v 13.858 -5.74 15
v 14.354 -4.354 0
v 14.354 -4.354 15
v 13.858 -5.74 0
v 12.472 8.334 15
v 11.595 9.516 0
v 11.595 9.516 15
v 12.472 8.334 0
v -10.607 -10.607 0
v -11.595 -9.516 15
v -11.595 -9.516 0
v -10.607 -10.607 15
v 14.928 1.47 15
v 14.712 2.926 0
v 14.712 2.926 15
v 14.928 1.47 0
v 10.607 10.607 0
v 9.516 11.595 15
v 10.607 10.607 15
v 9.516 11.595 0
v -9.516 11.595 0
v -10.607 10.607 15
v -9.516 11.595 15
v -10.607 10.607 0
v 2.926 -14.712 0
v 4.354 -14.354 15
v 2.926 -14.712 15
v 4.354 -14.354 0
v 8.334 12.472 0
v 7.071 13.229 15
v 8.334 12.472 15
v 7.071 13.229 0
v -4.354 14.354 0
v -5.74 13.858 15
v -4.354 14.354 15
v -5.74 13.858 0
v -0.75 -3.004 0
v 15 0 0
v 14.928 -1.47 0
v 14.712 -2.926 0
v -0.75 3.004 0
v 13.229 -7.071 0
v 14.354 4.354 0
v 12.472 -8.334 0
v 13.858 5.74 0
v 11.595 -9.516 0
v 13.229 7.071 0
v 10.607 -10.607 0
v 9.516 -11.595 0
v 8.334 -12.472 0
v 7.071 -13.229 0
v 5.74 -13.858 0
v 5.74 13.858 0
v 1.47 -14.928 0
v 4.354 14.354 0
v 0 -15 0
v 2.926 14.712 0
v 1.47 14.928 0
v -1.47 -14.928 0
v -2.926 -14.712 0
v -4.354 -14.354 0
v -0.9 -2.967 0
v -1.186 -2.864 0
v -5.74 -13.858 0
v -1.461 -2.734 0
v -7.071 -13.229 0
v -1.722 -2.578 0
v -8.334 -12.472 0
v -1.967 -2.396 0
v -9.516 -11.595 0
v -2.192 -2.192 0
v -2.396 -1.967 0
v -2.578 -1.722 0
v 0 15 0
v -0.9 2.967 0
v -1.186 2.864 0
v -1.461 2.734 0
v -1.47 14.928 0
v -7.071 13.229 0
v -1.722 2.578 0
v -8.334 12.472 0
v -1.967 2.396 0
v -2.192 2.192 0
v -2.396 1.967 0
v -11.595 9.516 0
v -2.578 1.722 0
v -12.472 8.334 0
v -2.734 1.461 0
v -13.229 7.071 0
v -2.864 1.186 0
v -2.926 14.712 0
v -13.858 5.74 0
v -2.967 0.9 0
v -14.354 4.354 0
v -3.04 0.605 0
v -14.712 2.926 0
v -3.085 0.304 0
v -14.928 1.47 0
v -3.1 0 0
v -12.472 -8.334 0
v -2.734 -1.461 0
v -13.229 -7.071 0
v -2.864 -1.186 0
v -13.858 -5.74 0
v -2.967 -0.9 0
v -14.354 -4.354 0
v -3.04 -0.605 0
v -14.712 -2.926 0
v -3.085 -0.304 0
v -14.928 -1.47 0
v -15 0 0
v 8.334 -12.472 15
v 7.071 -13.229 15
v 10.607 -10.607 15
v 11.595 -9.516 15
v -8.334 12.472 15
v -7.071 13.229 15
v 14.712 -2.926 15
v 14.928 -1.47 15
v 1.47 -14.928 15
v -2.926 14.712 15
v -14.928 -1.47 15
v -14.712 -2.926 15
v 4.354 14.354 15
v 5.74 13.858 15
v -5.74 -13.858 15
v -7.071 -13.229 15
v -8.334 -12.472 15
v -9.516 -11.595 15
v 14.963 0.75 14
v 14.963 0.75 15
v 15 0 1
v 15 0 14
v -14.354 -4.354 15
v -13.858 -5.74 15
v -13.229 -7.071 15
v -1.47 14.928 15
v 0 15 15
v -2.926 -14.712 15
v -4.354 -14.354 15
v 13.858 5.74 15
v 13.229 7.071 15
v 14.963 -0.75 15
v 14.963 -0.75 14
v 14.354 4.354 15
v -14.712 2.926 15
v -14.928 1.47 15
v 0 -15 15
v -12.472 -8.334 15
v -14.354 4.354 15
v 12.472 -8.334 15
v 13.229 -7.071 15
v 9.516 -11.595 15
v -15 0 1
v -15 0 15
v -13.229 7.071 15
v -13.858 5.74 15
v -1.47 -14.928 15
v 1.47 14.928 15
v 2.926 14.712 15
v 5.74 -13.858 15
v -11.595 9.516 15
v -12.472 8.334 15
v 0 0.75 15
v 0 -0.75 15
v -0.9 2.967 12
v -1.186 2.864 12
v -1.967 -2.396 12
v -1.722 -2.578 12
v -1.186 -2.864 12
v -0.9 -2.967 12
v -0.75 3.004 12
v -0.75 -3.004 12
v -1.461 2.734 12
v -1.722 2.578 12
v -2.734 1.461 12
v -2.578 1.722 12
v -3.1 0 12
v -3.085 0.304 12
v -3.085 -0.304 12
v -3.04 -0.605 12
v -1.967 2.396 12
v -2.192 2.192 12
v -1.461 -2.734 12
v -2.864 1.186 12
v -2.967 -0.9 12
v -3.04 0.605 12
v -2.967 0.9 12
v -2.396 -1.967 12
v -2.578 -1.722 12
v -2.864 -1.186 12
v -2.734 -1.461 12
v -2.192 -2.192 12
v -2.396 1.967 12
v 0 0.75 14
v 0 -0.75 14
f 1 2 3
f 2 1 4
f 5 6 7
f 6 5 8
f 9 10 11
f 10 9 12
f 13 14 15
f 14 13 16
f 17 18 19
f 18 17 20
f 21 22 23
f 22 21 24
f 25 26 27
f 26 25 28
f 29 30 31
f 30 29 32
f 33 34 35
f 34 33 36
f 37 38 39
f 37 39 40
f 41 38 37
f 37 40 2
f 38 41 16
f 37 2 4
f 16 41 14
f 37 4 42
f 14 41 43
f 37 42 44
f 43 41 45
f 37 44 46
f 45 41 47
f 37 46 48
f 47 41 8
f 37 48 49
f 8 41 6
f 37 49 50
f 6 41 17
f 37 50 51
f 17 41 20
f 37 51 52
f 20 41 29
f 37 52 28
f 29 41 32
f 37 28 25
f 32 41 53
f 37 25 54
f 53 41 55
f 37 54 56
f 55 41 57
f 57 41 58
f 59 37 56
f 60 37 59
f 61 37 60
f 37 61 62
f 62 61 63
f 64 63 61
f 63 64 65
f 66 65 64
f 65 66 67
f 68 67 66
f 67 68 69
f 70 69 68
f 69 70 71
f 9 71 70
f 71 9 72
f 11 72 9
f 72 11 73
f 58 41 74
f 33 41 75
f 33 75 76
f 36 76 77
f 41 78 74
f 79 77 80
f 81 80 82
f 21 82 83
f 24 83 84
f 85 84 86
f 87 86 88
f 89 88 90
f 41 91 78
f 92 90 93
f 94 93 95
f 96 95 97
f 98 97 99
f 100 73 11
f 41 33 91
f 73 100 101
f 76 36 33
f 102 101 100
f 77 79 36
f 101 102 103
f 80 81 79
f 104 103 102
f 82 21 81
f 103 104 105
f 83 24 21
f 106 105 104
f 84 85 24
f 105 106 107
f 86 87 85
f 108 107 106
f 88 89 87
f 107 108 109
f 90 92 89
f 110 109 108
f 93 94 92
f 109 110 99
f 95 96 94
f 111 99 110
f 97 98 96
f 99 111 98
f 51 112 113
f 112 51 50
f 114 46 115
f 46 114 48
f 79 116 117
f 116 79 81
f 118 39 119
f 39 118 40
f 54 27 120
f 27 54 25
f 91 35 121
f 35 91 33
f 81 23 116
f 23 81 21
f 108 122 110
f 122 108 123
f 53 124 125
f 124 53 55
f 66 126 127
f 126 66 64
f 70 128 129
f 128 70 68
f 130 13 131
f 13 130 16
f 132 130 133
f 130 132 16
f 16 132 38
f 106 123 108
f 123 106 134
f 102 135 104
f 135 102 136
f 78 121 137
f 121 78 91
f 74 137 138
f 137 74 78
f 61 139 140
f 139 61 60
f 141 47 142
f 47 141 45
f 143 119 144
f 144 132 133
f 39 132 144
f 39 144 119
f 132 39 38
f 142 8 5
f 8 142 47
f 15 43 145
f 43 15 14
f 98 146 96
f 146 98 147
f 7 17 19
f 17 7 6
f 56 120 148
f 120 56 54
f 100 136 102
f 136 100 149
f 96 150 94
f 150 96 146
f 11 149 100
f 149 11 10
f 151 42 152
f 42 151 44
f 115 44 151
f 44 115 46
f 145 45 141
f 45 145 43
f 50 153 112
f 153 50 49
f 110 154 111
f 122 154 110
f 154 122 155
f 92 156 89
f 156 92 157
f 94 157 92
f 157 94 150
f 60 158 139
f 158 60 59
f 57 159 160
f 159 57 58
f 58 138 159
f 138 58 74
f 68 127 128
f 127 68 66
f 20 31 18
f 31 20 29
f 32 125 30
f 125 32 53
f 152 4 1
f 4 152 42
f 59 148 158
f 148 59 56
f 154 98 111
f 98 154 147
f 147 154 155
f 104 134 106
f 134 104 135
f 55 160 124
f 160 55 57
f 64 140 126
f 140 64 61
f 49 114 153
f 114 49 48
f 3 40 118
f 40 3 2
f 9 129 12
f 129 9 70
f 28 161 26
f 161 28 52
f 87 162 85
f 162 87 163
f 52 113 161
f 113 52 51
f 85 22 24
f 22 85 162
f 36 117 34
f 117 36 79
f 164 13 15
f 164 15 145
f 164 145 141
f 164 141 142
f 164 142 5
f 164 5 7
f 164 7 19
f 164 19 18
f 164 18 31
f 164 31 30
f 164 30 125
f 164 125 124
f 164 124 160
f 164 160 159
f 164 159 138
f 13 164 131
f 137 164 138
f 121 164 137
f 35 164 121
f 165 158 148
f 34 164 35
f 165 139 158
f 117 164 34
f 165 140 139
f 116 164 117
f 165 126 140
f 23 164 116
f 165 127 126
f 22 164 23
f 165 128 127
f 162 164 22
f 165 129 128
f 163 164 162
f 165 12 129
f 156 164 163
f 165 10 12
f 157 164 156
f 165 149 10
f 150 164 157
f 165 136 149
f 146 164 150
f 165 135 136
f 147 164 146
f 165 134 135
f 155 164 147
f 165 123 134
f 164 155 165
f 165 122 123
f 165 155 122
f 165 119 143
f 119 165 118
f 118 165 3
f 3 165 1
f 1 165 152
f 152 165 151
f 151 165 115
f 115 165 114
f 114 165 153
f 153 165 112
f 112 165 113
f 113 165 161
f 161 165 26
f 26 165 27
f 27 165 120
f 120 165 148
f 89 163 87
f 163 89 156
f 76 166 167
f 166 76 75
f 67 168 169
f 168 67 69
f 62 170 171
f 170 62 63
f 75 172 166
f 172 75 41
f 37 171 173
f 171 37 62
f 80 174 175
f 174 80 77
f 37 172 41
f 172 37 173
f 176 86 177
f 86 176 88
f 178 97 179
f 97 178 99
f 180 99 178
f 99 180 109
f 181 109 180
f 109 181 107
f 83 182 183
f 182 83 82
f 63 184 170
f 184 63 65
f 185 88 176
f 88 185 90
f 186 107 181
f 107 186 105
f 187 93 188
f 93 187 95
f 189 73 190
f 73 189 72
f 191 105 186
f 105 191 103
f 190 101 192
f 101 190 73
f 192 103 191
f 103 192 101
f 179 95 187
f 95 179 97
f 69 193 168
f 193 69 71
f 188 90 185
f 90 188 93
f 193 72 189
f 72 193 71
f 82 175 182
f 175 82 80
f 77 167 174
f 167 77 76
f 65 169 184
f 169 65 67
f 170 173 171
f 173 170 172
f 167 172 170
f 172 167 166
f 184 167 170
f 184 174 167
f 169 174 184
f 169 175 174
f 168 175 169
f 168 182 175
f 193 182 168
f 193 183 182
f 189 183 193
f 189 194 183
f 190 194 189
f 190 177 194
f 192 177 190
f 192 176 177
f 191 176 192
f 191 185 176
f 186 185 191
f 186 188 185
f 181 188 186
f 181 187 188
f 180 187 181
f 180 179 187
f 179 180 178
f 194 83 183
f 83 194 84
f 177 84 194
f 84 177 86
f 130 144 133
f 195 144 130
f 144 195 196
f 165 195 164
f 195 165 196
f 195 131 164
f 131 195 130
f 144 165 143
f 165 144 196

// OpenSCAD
// Replacement knob for a hotplate stirrer with a 6 mm D-shaft.
// Designed for FDM printing, resting on the bottom face (z=0).

// --- Dimensions ---
knob_dia    = 30.0;    // Diameter of the knob
knob_height = 15.0;    // Total height of the knob
d_shaft_dia = 6.2;     // Diameter of the D-shaft hole
d_shaft_flat_dist = 4.7; // Distance from flat to opposite side of D-shaft
bore_depth   = 12.0;   // Depth of the D-shaped blind bore
num_grooves  = 18;     // Number of vertical grip grooves
groove_dia   = 2.0;    // Diameter of the grip grooves
pointer_w    = 1.5;    // Width of the pointer groove
pointer_d    = 1.0;    // Depth of the pointer groove

$fn = 64;

// --- Calculations ---
// The distance from the center to the flat side of the D-shaft.
chord_dist = d_shaft_flat_dist / 2;

// --- Modules ---

module d_shaft_profile() {
    // Creates a 2D D-shape profile
    difference() {
        circle(d = d_shaft_dia);
        // Subtract a rectangle to create the flat side.
        // The rectangle is moved so its edge is at chord_dist from center.
        // We use a large width to ensure it cuts through the circle.
        translate([chord_dist, 0])
            square([d_shaft_dia, d_shaft_dia], center = true);
    }
}

// --- Final Assembly ---

difference() {
    // 1. The Main Knob Body
    cylinder(h = knob_height, d = knob_dia);

    // 2. The D-shaped blind bore
    // We create the D-shape by extruding the 2D profile.
    // The flat side is oriented along the X-axis (positive X).
    translate([0, 0, -0.01])
    rotate([0, 0, 0])
    linear_extrude(height = bore_depth + 0.01)
    d_shaft_profile();

    // 3. Vertical Grip Grooves
    // 18 evenly spaced vertical grooves.
    // Each is a 2mm diameter half-cylinder centered on the outer surface.
    for (i = [0 : num_grooves - 1]) {
        angle = i * (360 / num_grooves);
        rotate([0, 0, angle])
        translate([knob_dia / 2, 0, 0])
        // We use a cylinder and subtract it from the knob.
        // To make it a "half-cylinder" on the surface, we center it on the edge.
        // We use a slightly larger height to ensure clean cuts.
        rotate([0, 90, 0])
        cylinder(h = groove_dia, d = groove_dia);
    }

    // 4. Pointer Groove
    // On the top face, 1.5mm wide, 1mm deep, from center to edge.
    // Located on the same side as the D-shaft flat (positive X).
    translate([0, -pointer_w / 2, knob_height - pointer_d])
    cube([knob_dia / 2 + 1, pointer_w, pointer_d + 0.01]);
}

// Note on orientation: 
// The part is built with the bottom face at Z=0.
// The D-shaft flat is oriented towards the positive X axis.
// The pointer is also oriented towards the positive X axis.
